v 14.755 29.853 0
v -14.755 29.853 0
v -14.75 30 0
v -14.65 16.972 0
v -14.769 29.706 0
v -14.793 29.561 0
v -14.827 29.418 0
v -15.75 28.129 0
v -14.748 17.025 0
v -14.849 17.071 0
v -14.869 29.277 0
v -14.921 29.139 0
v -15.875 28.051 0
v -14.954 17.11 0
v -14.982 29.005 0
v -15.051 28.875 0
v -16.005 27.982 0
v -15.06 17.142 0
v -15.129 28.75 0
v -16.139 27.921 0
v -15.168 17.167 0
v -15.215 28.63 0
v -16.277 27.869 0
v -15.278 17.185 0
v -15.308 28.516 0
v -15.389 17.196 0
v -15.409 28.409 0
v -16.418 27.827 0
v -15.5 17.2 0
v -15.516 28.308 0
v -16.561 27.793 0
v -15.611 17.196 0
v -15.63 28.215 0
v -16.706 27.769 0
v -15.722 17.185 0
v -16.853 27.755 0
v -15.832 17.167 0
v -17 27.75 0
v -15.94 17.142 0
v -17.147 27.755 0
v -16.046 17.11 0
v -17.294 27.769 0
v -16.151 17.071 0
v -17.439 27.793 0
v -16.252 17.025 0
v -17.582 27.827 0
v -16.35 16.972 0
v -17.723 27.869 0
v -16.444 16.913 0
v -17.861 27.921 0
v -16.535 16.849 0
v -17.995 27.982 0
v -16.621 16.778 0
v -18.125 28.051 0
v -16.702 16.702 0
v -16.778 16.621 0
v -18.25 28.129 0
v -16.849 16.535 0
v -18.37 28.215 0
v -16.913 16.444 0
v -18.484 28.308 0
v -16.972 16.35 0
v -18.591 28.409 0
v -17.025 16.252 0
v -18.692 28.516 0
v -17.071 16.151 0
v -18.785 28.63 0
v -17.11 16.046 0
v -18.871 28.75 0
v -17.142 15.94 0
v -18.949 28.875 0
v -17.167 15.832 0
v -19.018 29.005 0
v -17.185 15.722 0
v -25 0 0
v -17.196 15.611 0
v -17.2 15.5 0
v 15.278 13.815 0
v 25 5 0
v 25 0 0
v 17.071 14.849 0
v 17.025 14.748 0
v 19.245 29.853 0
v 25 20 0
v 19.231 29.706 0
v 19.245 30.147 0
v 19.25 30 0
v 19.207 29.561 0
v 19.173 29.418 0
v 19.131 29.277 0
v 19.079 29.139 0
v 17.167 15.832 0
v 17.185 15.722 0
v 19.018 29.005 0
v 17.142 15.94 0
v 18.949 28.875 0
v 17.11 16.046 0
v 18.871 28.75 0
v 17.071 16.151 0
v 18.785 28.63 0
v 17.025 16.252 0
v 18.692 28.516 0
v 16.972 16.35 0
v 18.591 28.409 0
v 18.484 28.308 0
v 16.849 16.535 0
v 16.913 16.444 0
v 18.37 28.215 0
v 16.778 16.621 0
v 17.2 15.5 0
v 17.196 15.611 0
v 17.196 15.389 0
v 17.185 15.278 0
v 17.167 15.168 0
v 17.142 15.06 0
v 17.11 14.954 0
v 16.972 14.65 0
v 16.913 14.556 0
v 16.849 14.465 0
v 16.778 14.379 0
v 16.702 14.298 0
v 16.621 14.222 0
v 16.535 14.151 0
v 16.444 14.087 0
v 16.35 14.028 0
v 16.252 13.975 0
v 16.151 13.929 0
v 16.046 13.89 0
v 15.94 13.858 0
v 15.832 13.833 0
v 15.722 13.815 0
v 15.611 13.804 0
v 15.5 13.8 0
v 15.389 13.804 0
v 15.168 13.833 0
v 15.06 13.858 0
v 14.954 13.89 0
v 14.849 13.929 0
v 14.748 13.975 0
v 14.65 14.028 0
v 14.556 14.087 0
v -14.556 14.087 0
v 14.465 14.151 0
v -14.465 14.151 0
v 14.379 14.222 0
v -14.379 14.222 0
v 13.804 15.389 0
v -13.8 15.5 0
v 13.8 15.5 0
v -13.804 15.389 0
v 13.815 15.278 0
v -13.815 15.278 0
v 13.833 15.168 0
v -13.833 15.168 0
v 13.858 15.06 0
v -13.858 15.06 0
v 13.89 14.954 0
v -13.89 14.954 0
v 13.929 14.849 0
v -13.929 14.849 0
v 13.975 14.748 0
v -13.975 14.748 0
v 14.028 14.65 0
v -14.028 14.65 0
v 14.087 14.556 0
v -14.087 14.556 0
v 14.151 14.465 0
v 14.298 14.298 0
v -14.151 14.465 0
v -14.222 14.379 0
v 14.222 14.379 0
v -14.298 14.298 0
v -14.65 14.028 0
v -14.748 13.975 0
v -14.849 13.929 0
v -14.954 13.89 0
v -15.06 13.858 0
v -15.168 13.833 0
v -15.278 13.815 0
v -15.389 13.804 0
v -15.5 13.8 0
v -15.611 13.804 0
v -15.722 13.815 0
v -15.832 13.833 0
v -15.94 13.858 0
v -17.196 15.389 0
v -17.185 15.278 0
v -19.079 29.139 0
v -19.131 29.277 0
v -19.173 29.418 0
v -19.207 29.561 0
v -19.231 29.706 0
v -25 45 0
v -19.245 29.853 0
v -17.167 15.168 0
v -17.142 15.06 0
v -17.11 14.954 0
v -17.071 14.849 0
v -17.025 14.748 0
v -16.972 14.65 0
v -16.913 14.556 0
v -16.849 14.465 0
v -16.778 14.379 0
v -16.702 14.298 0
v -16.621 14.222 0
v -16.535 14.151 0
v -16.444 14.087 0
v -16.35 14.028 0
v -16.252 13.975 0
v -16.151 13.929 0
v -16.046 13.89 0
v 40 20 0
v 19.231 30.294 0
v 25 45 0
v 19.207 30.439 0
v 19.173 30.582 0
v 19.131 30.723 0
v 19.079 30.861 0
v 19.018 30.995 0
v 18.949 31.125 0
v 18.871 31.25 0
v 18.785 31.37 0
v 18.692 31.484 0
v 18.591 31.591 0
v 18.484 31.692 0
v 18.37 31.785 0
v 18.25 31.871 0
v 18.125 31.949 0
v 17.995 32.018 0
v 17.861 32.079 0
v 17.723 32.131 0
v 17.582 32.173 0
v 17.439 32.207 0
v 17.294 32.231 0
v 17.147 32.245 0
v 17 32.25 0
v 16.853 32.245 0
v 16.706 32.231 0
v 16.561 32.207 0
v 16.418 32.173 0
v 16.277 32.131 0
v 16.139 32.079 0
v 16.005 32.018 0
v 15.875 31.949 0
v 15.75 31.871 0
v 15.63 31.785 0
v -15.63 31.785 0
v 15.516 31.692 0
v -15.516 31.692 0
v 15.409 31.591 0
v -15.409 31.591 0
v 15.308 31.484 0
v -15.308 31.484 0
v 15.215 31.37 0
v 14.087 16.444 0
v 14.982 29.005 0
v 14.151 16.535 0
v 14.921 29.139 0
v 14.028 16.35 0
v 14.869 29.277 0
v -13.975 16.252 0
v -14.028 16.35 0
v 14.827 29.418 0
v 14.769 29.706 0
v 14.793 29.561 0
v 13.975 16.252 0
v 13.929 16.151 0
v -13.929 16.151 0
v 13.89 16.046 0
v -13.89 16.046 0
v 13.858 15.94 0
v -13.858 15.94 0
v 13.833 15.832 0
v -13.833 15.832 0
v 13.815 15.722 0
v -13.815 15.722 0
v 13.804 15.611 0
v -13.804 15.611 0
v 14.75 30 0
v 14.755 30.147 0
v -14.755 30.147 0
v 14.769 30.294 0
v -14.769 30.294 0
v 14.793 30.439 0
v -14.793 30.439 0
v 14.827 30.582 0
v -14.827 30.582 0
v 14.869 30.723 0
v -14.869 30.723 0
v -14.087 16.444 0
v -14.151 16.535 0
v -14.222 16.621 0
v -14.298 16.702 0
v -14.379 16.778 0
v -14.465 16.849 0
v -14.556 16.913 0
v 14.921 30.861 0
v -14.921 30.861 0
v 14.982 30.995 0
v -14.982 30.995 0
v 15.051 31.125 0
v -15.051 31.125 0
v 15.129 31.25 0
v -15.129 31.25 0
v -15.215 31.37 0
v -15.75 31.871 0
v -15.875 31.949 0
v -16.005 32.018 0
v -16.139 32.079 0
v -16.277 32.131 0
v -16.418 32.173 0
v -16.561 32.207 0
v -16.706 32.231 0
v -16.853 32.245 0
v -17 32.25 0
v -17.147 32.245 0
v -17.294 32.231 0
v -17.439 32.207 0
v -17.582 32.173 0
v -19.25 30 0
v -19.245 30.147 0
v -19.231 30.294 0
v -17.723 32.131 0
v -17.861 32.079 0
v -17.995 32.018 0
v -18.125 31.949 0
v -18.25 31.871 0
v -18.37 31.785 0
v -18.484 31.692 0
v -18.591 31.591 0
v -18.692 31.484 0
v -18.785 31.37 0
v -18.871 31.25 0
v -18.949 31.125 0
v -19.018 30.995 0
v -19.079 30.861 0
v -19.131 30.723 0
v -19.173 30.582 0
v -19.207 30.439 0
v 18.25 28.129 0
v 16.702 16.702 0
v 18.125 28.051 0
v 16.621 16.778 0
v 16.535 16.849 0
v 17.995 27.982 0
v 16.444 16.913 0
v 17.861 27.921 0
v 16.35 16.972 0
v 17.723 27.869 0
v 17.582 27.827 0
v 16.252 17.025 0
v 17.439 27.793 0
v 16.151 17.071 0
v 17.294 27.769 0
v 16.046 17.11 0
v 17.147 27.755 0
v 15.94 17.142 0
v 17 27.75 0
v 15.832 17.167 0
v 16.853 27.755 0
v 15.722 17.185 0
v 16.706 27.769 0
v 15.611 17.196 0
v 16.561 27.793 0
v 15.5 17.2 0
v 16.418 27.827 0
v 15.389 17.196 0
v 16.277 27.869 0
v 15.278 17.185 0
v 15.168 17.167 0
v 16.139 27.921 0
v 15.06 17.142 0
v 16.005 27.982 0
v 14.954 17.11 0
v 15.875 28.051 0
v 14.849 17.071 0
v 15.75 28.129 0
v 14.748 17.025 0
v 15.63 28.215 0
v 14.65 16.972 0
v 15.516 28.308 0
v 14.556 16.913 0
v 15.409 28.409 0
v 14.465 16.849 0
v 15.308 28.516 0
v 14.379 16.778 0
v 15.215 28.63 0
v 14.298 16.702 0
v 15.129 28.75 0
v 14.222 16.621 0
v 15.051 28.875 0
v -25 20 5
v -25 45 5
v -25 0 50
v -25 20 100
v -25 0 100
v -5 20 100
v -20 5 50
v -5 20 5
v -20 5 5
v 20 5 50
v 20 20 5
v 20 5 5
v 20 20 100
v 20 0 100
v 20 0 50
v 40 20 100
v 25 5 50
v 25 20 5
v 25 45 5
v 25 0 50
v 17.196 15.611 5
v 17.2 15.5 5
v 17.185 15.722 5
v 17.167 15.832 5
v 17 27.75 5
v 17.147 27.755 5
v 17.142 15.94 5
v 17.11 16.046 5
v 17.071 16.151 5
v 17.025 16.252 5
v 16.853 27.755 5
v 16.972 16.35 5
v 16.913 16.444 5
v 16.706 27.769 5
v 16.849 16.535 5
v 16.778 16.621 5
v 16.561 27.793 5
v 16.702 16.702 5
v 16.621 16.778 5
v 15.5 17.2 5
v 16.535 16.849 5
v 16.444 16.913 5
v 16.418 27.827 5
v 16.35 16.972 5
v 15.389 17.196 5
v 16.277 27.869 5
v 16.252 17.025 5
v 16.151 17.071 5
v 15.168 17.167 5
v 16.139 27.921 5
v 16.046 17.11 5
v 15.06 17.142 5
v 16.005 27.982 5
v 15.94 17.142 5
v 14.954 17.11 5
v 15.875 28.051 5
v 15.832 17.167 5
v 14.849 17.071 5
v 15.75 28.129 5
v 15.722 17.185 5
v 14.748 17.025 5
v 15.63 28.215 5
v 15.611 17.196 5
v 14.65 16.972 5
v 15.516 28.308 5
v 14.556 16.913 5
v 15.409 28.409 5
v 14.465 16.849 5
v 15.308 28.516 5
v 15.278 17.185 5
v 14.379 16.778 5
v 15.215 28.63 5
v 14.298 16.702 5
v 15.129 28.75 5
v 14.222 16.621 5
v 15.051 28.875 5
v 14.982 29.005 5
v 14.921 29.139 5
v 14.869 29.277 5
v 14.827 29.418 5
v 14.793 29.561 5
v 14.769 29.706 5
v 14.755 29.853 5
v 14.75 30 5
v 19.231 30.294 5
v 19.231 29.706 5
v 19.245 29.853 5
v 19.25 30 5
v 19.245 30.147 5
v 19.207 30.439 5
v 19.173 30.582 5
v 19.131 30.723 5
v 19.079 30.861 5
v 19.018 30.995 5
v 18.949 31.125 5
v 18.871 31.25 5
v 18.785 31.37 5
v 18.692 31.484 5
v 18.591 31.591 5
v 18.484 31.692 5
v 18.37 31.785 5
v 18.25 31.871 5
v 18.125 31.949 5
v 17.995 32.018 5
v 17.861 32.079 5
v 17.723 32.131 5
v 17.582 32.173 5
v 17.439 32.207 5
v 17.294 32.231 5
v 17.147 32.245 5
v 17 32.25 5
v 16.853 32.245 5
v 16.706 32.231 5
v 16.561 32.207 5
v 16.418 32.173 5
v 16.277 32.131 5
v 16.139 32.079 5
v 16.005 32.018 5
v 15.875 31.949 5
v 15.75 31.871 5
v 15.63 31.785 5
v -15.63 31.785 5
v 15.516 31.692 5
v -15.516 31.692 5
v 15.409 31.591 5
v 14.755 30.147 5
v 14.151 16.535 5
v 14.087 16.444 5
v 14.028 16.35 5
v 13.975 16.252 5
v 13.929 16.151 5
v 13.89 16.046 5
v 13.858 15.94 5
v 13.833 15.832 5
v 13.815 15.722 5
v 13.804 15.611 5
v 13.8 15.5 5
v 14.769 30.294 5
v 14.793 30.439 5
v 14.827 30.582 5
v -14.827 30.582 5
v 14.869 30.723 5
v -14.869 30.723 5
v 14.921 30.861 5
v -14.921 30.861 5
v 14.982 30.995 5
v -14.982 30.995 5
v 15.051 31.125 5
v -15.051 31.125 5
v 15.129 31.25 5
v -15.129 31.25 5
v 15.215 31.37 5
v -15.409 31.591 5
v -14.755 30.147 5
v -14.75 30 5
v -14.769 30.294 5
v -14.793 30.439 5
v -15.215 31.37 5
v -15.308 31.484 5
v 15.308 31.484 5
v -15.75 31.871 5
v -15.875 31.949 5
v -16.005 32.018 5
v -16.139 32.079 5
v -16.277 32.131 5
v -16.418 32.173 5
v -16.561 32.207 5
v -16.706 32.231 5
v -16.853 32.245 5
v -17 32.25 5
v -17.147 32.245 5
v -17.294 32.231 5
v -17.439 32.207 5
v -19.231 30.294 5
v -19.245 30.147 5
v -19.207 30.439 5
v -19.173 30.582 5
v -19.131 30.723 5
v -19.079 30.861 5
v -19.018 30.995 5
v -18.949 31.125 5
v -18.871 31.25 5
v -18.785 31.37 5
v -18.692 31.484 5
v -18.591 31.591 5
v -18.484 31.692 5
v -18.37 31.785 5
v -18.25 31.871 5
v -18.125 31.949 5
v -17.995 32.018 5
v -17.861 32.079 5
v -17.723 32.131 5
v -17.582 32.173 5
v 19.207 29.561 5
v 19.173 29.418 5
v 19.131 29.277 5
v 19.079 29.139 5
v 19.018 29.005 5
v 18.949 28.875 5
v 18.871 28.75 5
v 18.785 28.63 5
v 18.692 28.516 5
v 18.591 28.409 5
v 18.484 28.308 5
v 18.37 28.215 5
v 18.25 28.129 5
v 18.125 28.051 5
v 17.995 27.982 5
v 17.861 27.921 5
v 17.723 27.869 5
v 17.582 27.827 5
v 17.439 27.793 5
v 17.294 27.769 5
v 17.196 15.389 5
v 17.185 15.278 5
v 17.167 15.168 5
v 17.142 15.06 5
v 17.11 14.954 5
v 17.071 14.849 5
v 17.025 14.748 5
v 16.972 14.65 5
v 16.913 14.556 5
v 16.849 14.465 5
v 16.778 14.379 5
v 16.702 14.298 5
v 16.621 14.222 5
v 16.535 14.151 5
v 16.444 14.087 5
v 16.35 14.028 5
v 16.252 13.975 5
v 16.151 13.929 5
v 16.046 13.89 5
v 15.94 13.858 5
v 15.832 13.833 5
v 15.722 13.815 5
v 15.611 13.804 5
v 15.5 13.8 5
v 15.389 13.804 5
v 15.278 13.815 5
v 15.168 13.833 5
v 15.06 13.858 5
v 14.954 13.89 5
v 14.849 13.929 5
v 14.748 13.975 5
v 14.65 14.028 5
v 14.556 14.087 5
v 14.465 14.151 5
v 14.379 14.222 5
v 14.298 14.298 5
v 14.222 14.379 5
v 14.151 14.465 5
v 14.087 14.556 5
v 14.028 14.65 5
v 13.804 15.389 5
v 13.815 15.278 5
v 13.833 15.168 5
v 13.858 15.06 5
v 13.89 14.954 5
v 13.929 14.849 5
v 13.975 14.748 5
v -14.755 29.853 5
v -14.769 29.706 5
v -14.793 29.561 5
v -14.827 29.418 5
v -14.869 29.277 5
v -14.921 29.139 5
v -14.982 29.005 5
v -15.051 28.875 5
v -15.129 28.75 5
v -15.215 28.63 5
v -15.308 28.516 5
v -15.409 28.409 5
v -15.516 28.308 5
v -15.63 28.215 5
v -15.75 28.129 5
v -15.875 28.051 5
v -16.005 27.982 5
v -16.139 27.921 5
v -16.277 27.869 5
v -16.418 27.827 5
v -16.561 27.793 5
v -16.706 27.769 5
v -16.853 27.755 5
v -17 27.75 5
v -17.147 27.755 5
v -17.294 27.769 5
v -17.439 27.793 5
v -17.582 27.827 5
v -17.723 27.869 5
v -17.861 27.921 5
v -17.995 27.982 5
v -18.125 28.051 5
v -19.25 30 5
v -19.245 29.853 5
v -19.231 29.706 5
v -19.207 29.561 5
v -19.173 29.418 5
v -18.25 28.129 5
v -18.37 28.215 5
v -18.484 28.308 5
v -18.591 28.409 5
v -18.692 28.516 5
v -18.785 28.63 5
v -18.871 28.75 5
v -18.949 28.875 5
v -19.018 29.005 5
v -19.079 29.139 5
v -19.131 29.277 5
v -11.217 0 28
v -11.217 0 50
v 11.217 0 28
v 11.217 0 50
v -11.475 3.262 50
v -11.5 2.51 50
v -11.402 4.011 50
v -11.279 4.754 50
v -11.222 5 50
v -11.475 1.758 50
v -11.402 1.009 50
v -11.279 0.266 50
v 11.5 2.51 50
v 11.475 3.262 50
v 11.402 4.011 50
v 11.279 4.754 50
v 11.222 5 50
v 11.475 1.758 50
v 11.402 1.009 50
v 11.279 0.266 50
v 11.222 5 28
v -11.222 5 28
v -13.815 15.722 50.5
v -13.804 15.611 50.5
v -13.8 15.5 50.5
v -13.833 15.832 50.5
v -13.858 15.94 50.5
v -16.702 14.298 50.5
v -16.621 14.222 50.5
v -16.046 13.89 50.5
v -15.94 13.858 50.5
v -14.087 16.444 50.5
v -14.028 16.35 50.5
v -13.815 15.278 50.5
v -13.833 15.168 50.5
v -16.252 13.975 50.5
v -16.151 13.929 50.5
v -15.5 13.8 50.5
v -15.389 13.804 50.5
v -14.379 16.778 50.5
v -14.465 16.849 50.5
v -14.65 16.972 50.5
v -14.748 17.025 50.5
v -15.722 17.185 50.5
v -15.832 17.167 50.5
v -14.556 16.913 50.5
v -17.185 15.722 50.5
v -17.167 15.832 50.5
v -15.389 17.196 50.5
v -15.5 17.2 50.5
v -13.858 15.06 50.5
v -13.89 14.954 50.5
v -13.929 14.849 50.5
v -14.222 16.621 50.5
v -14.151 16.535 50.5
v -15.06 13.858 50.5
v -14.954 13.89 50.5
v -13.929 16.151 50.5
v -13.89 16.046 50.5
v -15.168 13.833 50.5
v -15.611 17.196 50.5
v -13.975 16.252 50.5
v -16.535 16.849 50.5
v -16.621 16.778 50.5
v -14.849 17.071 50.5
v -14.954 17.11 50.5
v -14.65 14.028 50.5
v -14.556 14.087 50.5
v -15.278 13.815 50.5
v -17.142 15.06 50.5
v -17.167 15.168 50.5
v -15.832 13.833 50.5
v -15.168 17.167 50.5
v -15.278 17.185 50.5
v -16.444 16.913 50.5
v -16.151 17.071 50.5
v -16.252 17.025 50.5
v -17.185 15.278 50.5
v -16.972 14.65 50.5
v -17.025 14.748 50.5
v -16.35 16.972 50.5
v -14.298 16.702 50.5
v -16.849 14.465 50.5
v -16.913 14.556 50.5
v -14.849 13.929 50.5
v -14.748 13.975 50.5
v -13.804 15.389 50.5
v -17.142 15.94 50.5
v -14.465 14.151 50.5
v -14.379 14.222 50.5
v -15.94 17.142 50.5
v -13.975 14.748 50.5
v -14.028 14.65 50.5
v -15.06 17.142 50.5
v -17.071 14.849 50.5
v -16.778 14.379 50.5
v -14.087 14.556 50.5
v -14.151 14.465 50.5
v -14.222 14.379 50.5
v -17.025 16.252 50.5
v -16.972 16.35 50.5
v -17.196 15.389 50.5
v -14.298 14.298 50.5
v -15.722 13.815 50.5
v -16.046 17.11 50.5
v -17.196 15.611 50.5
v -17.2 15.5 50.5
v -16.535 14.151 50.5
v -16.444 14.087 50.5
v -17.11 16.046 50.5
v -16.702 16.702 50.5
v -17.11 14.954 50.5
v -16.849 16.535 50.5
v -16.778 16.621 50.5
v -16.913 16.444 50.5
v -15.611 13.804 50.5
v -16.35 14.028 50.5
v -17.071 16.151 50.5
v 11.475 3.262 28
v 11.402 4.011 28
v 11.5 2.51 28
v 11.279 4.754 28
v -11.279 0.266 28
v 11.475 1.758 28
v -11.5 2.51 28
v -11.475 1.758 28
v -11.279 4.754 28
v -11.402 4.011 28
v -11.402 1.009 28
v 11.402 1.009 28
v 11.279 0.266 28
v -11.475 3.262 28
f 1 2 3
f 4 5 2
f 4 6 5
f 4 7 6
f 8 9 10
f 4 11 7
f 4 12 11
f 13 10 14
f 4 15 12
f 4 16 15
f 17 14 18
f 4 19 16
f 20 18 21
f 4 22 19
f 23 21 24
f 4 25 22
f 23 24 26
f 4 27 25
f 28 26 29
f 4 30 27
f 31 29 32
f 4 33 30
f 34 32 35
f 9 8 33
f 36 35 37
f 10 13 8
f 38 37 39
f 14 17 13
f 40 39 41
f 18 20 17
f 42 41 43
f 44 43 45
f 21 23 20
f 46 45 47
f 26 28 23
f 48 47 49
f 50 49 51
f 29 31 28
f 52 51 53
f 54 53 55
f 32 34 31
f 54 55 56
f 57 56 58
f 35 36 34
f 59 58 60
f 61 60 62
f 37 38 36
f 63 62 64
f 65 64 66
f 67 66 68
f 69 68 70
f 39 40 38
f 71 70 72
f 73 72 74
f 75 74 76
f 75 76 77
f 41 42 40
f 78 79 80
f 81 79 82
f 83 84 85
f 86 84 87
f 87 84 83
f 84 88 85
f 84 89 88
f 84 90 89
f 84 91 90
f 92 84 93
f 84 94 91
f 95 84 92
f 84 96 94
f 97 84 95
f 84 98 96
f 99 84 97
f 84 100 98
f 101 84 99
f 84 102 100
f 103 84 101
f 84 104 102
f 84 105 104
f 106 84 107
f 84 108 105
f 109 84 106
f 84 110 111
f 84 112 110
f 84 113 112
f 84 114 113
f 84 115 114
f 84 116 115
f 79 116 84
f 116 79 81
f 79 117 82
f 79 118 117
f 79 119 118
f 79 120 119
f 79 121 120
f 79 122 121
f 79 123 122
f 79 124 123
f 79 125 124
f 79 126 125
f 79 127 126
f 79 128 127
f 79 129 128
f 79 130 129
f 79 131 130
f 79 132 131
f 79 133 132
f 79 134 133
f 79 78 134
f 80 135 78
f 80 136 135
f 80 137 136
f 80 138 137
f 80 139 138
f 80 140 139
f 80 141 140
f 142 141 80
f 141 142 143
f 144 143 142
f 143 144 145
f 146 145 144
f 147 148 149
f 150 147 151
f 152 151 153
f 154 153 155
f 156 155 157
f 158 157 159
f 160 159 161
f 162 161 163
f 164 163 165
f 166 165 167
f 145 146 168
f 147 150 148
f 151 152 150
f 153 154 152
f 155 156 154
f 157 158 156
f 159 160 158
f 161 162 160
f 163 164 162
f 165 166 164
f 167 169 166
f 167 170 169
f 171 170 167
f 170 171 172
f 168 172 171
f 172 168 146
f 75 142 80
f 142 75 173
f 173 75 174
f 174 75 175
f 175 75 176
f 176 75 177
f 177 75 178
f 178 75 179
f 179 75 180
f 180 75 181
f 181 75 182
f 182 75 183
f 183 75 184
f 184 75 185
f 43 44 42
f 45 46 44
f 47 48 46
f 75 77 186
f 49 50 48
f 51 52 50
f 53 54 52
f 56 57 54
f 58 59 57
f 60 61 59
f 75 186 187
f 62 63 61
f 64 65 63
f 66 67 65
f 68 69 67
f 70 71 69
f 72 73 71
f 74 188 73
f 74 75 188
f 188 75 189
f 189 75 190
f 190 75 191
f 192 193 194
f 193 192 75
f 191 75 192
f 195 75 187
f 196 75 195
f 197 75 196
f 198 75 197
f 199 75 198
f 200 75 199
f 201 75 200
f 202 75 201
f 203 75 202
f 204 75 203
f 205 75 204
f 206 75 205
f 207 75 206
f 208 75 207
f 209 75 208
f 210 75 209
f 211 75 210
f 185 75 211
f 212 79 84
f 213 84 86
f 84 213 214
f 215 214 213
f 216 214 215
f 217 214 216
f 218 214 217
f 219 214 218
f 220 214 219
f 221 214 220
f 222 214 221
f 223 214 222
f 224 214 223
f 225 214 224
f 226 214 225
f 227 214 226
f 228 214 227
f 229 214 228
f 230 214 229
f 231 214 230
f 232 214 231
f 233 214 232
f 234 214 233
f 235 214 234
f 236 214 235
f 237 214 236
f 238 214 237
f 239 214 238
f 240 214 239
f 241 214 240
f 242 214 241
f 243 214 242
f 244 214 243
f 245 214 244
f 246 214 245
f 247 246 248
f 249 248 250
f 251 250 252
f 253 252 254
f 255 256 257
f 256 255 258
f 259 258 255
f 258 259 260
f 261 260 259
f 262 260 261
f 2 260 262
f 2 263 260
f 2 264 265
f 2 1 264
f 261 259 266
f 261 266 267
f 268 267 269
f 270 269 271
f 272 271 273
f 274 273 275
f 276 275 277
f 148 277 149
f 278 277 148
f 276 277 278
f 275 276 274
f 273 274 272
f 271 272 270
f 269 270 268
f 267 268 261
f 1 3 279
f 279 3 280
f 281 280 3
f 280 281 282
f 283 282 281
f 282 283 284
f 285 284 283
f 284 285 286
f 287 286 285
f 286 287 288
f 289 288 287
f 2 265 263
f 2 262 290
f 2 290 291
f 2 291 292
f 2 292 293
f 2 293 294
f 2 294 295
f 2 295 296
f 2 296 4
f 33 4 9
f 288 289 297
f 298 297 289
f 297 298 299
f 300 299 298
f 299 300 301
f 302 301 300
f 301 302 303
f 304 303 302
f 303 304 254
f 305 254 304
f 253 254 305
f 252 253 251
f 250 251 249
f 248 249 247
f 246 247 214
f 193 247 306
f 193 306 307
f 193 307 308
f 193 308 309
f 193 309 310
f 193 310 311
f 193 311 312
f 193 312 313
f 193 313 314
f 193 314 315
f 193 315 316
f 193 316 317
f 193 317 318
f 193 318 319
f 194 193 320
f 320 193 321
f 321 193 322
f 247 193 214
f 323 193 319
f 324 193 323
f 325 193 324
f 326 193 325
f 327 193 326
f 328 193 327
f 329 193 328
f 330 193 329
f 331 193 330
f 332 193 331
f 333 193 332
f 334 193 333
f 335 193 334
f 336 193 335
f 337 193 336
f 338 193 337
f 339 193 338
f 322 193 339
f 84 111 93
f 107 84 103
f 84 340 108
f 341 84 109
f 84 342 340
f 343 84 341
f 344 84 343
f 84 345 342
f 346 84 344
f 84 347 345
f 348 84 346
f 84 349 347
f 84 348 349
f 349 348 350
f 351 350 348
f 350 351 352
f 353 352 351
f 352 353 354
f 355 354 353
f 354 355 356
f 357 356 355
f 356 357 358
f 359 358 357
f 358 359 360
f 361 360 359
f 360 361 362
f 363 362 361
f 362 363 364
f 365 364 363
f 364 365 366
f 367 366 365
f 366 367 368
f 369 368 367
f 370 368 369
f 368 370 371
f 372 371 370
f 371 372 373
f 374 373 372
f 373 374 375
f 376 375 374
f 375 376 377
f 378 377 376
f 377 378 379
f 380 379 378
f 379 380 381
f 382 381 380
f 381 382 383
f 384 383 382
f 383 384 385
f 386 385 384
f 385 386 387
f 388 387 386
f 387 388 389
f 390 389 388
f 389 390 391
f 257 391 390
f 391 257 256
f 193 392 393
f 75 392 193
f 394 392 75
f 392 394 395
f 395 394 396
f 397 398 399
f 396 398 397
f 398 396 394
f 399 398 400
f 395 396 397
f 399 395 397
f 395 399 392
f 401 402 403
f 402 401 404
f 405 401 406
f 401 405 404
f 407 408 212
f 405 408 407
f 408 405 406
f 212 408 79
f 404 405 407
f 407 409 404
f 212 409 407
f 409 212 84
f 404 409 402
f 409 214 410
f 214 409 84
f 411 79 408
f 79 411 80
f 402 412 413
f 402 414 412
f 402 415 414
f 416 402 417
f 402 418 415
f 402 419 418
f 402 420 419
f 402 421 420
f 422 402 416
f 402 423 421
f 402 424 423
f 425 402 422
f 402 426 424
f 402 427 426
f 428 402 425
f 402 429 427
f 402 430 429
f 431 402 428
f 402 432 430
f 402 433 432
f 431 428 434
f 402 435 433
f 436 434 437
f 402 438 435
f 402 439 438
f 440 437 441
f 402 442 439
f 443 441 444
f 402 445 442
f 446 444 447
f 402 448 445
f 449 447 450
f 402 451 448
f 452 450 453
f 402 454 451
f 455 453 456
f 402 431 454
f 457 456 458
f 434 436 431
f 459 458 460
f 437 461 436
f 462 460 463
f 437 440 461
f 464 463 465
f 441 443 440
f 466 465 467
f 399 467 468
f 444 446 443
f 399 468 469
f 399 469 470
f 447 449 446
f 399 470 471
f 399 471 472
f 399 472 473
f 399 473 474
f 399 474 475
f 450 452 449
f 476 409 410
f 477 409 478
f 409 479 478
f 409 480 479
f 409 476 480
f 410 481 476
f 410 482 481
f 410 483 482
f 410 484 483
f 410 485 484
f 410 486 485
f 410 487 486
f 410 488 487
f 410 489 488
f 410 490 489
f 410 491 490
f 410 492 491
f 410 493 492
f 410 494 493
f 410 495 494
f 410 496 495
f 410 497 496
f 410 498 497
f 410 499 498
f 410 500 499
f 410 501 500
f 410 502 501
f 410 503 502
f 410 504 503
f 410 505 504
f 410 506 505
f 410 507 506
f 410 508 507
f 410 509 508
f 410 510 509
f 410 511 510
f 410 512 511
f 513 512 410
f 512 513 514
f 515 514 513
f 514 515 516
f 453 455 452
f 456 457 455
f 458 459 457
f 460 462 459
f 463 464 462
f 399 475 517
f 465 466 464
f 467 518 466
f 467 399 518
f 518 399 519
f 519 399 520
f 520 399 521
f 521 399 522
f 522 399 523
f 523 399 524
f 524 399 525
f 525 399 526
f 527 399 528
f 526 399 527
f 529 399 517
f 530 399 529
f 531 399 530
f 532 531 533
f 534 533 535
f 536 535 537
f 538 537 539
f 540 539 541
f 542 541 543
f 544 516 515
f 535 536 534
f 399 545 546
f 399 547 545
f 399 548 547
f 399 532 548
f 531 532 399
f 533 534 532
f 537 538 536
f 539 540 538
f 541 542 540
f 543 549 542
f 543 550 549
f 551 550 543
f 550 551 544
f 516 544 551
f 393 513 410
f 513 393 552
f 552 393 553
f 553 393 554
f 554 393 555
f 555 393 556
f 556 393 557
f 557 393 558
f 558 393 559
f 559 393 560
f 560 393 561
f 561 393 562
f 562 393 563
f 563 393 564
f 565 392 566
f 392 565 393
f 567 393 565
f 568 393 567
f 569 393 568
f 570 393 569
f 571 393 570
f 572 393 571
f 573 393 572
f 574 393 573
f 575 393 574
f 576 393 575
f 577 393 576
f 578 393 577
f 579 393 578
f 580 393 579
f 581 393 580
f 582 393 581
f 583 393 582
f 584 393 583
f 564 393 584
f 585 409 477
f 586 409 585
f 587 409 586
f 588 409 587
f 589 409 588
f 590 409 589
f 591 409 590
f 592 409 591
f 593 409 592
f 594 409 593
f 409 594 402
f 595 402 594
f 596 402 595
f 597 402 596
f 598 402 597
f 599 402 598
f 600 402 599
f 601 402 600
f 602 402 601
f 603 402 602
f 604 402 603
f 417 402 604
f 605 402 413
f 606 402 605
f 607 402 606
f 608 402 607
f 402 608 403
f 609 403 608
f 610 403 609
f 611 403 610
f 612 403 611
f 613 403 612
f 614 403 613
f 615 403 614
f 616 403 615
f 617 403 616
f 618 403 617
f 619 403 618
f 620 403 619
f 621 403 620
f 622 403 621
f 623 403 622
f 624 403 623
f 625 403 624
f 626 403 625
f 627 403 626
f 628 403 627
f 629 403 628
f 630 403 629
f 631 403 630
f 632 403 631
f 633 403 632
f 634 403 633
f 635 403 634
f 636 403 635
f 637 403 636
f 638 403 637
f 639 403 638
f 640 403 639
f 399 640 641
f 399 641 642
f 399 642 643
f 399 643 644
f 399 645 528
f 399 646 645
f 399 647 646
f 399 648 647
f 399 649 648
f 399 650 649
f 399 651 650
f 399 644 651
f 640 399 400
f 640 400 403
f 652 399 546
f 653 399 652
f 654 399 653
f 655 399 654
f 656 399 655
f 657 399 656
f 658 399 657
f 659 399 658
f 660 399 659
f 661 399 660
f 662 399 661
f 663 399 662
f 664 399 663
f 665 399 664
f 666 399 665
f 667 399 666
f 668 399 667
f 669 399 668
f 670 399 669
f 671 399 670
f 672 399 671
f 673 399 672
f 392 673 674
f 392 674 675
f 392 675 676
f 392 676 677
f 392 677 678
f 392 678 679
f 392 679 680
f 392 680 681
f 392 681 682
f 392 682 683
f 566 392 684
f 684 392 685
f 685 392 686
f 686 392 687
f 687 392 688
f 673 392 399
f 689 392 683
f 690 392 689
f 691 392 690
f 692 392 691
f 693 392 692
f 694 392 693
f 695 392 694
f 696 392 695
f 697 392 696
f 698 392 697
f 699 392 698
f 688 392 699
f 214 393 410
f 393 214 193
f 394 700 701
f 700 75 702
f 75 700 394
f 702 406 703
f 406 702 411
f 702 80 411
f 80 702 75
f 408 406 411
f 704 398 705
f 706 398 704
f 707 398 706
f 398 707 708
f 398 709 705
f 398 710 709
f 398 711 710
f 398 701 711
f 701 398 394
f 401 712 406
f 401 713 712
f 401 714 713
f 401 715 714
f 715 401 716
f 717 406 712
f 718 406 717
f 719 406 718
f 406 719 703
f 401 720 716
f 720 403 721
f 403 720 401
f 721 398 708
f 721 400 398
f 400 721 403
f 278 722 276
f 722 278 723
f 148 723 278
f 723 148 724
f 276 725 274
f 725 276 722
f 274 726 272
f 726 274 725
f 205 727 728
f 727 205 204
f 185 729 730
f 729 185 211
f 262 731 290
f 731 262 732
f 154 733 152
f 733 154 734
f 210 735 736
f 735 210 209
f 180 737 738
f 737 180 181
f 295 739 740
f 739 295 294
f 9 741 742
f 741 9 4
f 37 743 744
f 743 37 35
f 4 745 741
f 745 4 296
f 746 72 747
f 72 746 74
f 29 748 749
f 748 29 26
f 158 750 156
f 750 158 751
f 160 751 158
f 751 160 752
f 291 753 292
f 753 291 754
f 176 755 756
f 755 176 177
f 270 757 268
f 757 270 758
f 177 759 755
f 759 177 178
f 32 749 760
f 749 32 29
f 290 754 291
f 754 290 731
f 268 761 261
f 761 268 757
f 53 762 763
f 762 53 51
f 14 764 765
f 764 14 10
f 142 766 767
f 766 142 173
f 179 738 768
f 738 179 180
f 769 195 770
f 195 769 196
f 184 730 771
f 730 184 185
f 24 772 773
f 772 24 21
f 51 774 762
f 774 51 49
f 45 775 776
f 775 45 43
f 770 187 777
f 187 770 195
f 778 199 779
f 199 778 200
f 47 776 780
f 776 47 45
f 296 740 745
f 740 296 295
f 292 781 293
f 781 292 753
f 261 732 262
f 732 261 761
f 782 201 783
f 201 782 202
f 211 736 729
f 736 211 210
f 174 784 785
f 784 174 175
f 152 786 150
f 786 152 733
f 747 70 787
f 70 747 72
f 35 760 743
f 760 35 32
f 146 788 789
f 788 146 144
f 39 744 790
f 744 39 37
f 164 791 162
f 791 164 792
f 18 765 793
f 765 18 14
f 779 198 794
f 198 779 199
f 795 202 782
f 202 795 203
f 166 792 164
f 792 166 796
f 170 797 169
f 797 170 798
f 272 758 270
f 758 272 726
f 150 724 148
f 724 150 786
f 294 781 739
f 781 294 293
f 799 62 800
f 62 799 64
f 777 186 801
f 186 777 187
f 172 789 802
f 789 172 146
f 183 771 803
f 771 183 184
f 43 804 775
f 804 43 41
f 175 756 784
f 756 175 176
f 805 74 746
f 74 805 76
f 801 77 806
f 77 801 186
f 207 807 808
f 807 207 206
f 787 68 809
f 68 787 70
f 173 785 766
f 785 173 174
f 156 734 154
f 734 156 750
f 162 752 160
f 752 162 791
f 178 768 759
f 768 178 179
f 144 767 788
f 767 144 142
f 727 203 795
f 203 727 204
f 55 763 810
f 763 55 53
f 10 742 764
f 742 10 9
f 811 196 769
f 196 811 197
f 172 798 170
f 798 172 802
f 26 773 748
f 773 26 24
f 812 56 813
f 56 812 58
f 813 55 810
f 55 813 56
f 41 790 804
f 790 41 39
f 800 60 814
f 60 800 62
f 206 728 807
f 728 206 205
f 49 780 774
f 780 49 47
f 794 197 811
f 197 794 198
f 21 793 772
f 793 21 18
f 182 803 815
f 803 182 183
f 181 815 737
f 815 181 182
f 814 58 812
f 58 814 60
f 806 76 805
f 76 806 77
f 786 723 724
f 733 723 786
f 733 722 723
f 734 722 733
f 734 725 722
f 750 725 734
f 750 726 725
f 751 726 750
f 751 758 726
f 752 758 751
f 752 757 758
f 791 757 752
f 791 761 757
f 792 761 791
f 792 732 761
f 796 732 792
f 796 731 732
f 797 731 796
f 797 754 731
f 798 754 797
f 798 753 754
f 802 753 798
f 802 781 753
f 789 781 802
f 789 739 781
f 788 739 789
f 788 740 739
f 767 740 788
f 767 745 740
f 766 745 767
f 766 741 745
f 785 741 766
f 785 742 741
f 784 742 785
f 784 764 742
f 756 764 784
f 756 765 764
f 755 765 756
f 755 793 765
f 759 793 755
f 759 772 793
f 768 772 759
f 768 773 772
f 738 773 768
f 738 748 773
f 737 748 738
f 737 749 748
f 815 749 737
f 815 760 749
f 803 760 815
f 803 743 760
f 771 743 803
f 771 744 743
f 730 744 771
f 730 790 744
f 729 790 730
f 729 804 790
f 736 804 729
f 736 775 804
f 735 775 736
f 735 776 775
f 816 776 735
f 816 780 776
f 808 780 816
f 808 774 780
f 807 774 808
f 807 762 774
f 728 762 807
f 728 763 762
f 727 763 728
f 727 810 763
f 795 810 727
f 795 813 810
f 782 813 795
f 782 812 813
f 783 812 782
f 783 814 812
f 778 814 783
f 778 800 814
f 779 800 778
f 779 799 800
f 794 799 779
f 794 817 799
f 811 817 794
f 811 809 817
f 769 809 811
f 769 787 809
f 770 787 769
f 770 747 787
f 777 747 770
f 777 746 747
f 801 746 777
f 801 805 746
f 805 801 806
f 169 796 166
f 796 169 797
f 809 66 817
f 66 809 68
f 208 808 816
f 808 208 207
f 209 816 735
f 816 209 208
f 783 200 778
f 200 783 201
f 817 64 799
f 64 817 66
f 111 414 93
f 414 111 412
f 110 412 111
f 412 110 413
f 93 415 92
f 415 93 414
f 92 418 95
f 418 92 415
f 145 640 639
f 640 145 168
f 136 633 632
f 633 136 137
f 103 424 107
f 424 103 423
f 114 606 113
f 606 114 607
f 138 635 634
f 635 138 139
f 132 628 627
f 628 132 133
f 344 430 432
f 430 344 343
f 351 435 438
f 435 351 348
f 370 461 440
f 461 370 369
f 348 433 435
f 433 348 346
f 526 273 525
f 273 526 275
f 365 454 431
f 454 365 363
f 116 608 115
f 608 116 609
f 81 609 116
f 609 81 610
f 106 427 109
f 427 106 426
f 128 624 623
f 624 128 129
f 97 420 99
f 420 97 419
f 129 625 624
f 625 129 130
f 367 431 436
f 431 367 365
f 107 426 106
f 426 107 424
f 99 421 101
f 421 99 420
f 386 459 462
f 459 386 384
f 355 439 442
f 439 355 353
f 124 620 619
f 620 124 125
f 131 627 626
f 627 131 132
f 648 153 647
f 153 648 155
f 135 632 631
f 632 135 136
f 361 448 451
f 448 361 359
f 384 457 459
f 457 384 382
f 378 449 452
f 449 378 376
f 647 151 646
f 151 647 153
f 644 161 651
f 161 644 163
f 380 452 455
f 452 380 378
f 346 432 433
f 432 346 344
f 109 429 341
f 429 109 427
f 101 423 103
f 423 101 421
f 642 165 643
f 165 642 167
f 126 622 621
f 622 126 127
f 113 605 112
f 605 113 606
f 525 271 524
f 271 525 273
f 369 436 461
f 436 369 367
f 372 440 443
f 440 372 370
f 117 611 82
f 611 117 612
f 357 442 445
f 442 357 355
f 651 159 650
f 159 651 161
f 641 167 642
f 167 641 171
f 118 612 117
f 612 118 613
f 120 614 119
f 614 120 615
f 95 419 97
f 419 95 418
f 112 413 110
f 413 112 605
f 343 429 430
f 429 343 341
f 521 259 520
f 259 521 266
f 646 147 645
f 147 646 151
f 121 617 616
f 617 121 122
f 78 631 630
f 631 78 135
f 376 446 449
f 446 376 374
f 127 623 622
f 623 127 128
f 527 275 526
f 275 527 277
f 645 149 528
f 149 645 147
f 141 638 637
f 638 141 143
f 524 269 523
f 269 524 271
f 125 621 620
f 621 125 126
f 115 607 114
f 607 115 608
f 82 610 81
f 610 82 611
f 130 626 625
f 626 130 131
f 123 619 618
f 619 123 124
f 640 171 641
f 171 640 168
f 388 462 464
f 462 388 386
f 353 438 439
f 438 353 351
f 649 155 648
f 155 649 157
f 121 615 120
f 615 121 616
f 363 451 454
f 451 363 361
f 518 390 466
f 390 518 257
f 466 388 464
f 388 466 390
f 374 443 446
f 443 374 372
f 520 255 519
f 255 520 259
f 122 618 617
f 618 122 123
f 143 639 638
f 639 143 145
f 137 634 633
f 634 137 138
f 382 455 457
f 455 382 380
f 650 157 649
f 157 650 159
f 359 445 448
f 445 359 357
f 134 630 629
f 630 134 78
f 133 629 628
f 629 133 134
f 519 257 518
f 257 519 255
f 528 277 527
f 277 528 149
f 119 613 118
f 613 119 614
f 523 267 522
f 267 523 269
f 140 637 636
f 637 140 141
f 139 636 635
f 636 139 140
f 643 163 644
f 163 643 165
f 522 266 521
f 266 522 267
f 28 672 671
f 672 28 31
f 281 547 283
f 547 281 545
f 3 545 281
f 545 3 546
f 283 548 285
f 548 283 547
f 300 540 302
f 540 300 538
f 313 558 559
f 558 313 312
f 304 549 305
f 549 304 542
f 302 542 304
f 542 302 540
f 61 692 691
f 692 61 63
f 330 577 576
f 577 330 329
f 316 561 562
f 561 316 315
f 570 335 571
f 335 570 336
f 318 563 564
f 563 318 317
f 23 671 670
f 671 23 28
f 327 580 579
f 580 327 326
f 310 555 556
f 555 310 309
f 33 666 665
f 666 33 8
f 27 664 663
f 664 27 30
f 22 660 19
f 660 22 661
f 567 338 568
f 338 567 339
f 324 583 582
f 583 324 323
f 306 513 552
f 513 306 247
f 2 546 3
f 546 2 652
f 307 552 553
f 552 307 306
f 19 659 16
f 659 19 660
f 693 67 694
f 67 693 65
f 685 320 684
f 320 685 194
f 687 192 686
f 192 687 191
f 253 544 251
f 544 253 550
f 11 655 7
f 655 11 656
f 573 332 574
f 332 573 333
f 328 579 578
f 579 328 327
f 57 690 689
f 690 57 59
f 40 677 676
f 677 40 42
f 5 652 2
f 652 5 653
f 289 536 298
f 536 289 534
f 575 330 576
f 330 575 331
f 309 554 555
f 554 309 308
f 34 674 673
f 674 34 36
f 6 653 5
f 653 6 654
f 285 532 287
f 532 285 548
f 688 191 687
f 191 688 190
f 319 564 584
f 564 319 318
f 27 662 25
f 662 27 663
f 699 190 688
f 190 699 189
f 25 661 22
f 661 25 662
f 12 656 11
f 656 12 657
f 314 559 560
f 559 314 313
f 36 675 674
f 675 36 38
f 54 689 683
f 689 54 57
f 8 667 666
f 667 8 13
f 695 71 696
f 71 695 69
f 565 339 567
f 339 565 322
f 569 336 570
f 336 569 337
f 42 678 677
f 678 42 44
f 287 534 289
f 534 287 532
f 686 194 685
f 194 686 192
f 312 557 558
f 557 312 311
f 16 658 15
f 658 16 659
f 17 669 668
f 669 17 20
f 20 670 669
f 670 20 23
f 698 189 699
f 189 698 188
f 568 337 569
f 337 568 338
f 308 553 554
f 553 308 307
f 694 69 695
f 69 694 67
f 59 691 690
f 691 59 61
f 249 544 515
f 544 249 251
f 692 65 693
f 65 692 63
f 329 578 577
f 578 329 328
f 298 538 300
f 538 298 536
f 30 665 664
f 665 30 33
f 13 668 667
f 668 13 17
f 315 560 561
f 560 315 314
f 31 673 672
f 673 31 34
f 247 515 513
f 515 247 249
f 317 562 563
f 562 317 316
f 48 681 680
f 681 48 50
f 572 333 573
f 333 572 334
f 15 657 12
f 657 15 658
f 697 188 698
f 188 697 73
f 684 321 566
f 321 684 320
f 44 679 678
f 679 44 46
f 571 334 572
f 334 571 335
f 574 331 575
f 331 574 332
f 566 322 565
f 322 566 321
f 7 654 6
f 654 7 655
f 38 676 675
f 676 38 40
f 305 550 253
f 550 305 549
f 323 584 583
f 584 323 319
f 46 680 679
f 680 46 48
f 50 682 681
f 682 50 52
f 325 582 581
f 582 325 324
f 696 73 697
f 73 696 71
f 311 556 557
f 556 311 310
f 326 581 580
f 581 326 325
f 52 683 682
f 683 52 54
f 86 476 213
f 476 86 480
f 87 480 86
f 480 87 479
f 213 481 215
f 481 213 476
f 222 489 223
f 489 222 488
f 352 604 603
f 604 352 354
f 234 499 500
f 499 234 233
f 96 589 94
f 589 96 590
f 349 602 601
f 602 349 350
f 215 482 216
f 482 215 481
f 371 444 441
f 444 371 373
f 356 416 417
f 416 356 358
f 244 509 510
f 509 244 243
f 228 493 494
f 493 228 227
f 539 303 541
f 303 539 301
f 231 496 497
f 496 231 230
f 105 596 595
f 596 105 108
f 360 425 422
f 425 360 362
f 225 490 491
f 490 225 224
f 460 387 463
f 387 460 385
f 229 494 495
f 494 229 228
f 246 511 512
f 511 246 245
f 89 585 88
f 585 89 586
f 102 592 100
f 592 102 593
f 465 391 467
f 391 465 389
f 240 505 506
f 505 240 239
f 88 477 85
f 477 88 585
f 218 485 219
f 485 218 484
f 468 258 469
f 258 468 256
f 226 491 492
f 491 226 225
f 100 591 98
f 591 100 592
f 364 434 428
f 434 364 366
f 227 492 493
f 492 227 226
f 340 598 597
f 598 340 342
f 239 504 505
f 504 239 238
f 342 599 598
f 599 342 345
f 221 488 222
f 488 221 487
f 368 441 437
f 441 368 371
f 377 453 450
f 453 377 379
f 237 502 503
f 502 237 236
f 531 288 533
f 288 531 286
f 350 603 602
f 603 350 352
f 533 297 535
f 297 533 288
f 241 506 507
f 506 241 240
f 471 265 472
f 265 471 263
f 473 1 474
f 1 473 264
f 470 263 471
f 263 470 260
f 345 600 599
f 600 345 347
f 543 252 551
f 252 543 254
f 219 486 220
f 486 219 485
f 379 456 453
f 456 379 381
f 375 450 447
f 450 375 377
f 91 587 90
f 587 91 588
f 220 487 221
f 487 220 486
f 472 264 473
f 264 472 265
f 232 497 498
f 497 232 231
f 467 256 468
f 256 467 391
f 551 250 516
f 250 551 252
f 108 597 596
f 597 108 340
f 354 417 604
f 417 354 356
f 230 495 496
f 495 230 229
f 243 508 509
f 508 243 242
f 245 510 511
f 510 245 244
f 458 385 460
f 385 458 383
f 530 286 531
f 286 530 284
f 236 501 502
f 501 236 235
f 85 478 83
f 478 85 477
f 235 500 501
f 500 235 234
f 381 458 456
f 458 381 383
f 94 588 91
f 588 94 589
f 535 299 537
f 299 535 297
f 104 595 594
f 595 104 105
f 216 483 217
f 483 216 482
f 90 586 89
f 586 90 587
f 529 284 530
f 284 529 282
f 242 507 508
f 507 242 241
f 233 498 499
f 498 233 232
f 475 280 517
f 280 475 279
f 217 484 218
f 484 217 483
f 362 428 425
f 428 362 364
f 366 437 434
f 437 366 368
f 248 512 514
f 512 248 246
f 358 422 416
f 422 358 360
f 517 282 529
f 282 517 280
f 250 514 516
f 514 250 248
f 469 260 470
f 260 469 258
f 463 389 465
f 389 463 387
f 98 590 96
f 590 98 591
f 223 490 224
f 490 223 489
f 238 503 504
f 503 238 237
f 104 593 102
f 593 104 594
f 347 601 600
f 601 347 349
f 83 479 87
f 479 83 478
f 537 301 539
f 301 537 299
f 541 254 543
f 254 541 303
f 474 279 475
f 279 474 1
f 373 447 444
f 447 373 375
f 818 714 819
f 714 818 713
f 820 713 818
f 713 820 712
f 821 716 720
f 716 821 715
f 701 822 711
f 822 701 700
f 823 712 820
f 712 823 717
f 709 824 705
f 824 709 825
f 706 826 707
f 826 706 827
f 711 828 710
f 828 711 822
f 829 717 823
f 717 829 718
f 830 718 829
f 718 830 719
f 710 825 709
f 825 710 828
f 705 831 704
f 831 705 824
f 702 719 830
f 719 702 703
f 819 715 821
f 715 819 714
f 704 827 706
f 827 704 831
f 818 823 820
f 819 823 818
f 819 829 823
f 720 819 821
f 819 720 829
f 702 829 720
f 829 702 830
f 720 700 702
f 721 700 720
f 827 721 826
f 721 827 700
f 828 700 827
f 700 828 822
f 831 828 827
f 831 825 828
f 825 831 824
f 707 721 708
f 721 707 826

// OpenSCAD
// NEMA 17 stepper motor L-shaped mounting bracket
// Print orientation: base plate on the bed, vertical plate building up in +Z

// ---------------- Parameters ----------------
plate_x      = 25;     // base plate half-length in X (total 50 mm)
plate_y      = 45;     // base plate length in Y
plate_t      = 5;      // base plate thickness in Z

hole_m4_x    = 17;     // M4 hole X offset from origin (+/-)
hole_m4_y    = 30;     // M4 hole Y position
hole_m4_d    = 4.5;    // M4 hole diameter

plate_z      = 50;     // vertical motor plate height in Z
plate_y2     = 5;      // vertical plate Y thickness (0 to 5)

boss_d       = 23;     // motor centring boss hole diameter
boss_x       = 0;      // boss hole X centre
boss_z       = 28;     // boss hole Z centre

screw_d      = 3.4;    // M3 screw hole diameter
screw_pitch  = 31;     // M3 screw square pattern size (X and Y)

gusset_t     = 5;      // gusset thickness along X
gusset_y     = 20;     // gusset leg along +Y
gusset_z     = 20;     // gusset leg along +Z

eps          = 0.5;    // cutter overshoot past faces

$fn = 96;

// ---------------- Model ----------------
difference() {
    union() {
        // Base plate
        translate([-plate_x, 0, 0])
            cube([plate_x * 2, plate_y, plate_t]);

        // Vertical motor plate
        translate([-plate_x, 0, 0])
            cube([plate_x * 2, plate_y2, plate_z]);

        // Gussets, flush with left and right edges
        for (sx = [-1, 1])
            translate([sx > 0 ? plate_x - gusset_t : -plate_x, 0, 0])
                linear_extrude([gusset_y, gusset_z])
                    polygon([[0, gusset_y], [gusset_z, gusset_z], [0, 0]]);
    }

    // Through-holes
    translate([-hole_m4_x, hole_m4_y, -eps])
        cylinder(d = hole_m4_d, h = plate_t + 2 * eps);
    translate([hole_m4_x, hole_m4_y, -eps])
        cylinder(d = hole_m4_d, h = plate_t + 2 * eps);

    // Motor centring boss hole
    translate([boss_x, plate_y2 / 2 + 0.01, boss_z])
        cylinder(d = boss_d, h = plate_z - boss_z + 1.5, $fn = 96);

    // M3 screw holes on square pattern
    for (i = [-1, 1])
        for (j = [-1, 1])
            translate([i * screw_pitch / 2, j * screw_pitch / 2, -eps])
                cylinder(d = screw_d, h = plate_z + 2 * eps, $fn = 96);
}
